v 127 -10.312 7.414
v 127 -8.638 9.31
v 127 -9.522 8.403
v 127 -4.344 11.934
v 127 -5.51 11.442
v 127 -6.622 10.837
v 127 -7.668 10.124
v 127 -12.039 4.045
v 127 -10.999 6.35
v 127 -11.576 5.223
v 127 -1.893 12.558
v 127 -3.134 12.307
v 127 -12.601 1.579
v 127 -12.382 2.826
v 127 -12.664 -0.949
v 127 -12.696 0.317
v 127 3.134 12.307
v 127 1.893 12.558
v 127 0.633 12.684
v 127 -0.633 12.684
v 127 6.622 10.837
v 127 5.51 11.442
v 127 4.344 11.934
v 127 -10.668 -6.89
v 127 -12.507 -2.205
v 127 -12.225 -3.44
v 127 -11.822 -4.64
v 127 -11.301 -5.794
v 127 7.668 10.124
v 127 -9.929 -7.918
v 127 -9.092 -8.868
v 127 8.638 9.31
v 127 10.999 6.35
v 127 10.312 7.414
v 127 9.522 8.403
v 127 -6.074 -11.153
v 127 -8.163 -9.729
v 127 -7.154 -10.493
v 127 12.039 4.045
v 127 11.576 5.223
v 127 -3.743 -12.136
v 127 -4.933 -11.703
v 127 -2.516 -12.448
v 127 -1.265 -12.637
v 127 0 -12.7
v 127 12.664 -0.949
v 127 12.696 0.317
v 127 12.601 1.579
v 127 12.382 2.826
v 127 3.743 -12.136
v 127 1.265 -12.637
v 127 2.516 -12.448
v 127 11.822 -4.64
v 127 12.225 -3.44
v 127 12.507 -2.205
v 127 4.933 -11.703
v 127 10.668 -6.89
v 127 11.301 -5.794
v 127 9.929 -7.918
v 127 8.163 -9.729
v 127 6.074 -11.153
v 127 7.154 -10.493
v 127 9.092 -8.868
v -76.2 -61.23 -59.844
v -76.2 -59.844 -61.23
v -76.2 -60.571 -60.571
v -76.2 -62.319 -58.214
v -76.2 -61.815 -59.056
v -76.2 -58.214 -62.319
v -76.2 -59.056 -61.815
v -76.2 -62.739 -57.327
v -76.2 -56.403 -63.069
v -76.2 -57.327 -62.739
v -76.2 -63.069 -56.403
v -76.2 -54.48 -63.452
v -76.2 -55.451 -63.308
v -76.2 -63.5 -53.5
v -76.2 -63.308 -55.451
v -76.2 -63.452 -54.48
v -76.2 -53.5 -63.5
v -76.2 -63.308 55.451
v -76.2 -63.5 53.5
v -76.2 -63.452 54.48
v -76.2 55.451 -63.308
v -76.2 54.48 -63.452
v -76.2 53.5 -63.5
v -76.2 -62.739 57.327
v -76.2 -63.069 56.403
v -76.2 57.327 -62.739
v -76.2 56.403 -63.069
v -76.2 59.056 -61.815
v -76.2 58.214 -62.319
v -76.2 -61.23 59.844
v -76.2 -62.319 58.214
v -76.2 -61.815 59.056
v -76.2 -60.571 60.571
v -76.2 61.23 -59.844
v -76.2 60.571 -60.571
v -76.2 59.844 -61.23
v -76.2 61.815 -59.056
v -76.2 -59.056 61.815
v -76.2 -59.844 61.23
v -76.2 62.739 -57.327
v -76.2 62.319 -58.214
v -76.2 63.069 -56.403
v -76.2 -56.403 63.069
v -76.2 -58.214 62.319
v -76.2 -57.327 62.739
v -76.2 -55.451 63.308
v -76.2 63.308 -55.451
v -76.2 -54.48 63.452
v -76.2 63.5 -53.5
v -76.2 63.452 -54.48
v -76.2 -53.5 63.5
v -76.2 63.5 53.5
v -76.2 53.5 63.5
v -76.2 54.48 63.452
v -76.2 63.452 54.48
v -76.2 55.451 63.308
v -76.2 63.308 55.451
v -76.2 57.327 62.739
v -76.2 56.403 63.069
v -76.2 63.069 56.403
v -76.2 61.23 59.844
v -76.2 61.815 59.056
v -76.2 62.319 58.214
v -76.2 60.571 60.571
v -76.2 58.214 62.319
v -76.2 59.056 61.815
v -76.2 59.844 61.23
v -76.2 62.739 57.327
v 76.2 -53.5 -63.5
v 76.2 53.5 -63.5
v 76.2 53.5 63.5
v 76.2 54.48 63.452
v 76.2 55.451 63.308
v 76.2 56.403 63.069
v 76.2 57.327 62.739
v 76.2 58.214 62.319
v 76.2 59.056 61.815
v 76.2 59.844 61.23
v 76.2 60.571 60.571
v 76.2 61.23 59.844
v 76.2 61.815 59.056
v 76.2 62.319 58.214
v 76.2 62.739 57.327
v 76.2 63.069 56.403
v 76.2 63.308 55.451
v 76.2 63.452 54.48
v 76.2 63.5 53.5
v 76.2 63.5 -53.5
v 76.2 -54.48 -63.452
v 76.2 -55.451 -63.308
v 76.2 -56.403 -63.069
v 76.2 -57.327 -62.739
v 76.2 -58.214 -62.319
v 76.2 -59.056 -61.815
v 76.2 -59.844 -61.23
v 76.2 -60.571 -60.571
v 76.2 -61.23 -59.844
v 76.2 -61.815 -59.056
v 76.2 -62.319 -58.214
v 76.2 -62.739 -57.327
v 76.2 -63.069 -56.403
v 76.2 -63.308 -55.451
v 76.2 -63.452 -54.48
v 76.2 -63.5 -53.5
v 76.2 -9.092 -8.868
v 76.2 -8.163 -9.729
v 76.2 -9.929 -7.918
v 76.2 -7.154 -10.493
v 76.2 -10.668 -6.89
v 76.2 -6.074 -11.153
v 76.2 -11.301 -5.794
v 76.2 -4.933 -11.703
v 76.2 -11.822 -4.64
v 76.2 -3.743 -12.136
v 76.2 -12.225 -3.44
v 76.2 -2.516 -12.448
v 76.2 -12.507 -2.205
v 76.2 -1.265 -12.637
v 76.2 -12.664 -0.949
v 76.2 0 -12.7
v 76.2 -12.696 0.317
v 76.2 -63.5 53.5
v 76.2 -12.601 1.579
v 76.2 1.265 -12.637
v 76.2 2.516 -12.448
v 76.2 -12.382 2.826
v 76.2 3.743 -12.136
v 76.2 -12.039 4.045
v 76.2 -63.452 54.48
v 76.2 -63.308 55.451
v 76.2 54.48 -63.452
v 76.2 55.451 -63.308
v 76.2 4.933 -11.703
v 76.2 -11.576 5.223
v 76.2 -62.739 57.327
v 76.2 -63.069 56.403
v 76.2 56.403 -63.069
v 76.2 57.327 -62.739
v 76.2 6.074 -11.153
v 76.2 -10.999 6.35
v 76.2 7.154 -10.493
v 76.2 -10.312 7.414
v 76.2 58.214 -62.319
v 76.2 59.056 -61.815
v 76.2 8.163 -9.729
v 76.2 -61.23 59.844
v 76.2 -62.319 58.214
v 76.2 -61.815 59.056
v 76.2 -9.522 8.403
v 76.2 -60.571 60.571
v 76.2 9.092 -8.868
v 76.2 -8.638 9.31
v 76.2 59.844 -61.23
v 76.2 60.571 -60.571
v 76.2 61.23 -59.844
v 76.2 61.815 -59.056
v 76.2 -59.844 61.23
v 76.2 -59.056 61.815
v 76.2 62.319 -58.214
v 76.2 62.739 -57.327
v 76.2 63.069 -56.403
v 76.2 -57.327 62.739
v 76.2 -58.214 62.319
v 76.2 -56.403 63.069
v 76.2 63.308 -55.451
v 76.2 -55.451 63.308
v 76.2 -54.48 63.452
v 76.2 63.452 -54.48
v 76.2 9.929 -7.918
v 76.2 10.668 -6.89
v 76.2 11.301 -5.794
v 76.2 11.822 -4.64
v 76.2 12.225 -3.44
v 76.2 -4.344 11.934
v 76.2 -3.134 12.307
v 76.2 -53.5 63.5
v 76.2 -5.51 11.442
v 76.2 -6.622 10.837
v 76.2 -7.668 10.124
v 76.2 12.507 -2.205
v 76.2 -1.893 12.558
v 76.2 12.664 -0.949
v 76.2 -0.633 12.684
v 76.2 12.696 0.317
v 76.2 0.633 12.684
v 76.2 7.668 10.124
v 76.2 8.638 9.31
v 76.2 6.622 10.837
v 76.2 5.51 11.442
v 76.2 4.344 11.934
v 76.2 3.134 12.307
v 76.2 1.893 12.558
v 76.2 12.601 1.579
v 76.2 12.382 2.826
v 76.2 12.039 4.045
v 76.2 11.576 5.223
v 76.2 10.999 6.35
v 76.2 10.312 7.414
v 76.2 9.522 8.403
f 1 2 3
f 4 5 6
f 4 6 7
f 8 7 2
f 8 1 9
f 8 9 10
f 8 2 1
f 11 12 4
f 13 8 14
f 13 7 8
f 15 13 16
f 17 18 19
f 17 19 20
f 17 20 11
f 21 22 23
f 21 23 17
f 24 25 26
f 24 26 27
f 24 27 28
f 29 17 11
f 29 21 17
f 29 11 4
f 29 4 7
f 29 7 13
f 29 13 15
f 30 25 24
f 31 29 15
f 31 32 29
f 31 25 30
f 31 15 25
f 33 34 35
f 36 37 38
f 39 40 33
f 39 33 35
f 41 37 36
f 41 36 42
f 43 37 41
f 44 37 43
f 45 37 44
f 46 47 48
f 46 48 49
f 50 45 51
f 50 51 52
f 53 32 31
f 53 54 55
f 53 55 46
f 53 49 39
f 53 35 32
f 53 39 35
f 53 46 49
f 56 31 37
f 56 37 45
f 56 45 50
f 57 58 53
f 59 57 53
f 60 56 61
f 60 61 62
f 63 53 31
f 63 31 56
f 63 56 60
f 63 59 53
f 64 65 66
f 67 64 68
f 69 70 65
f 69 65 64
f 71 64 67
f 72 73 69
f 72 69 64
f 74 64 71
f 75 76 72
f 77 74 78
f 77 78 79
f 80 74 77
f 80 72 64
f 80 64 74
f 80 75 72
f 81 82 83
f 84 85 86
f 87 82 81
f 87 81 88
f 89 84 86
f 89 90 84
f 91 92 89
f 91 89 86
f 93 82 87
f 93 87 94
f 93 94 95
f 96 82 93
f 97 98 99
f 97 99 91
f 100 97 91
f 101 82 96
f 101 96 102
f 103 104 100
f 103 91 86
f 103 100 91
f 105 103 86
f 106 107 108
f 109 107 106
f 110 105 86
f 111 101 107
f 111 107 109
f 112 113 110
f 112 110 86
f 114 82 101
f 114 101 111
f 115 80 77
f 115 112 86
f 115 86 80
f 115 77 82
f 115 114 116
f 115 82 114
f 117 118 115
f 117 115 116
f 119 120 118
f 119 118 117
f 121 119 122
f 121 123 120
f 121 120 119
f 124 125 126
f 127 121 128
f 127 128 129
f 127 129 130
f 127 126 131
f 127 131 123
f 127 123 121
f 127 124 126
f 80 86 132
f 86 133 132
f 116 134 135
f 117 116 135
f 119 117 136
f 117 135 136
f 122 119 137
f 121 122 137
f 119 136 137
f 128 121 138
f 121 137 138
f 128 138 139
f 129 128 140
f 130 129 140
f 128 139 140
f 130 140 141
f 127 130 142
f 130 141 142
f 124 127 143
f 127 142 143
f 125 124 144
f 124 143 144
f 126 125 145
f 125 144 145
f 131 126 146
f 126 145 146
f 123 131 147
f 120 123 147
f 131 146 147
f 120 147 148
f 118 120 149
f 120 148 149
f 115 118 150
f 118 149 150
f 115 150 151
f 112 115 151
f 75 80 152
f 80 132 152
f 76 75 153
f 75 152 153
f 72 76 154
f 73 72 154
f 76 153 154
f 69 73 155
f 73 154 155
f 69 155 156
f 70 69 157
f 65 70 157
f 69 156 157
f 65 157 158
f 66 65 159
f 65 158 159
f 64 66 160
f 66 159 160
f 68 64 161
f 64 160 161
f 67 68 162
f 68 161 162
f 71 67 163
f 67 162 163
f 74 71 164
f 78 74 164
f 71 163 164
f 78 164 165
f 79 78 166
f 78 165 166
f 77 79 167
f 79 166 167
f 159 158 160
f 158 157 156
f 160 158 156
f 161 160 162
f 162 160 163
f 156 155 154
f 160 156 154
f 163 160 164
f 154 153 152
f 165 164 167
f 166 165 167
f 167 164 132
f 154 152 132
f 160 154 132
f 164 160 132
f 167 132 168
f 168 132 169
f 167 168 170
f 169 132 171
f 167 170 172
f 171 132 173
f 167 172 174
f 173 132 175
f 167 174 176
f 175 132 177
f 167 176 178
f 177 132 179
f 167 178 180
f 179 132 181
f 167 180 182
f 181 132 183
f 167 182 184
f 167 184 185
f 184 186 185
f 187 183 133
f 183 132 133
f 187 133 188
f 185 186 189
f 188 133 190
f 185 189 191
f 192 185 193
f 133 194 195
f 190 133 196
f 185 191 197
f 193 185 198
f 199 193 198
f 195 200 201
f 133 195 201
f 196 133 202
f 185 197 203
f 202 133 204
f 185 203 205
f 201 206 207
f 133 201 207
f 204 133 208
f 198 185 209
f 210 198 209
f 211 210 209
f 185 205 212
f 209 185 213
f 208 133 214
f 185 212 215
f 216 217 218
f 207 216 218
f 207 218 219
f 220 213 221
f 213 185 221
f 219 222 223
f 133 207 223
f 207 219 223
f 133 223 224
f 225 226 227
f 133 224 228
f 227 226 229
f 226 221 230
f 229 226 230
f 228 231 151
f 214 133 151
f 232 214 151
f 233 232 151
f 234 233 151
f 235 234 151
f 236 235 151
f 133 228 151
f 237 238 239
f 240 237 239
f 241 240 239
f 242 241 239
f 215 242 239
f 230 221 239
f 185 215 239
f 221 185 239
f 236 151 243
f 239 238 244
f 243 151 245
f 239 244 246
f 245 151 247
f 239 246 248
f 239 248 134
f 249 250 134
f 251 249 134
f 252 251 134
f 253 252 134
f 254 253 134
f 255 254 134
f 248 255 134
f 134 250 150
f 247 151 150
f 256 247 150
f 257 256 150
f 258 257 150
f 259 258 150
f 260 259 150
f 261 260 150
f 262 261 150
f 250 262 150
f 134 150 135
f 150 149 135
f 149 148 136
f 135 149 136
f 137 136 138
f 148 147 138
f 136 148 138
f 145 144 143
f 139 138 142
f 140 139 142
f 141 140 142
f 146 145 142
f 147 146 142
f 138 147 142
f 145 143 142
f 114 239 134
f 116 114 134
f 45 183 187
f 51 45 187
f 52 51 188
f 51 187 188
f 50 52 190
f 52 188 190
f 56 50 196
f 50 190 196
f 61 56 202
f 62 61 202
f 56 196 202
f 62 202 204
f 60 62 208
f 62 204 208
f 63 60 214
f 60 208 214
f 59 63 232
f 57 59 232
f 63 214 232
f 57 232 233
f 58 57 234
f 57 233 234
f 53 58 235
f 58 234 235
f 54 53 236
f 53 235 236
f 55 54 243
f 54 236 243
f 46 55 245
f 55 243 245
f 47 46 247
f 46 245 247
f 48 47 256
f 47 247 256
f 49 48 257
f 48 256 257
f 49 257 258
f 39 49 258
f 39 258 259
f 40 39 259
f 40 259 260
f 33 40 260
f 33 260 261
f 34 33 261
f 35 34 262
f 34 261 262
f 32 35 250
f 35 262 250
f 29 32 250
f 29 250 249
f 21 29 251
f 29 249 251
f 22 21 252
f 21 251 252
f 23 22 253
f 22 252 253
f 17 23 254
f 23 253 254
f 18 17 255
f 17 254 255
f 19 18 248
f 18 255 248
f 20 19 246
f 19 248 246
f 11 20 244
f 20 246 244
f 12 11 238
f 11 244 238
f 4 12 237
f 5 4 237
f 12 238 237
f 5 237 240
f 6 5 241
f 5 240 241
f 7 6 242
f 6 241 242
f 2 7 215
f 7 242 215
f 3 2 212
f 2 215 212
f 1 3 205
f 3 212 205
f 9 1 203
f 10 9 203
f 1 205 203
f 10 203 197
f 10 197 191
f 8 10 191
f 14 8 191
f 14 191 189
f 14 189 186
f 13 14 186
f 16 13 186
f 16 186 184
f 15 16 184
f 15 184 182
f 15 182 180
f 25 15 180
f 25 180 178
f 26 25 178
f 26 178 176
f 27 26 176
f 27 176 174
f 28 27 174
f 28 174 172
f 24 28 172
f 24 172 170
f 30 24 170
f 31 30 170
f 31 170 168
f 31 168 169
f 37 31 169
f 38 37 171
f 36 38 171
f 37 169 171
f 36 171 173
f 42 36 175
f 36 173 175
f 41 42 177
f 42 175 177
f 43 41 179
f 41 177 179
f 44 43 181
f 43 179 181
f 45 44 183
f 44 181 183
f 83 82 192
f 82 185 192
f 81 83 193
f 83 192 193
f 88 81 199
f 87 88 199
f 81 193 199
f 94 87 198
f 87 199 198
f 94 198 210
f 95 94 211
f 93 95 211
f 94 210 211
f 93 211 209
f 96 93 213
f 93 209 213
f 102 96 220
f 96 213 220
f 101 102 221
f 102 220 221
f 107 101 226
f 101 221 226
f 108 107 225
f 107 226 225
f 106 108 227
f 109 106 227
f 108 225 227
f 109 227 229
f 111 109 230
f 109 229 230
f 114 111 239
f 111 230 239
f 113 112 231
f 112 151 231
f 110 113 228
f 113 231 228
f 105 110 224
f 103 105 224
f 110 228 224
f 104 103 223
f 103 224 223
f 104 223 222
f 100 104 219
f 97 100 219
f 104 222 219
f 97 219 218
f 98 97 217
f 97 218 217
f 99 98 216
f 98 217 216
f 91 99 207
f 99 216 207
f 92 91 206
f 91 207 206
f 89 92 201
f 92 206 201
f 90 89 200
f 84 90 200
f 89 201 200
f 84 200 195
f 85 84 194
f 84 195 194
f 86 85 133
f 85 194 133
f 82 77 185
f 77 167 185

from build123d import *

# Parameters (mm, degrees)
BOSS_EXTRUDE1_DEPTH = 76.2
SKETCH2_R           = 12.7
BOSS_EXTRUDE2_DEPTH = 50.8


with BuildPart() as part:
    # Sketch1 → Boss-Extrude1 (new body, symmetric)
    with BuildSketch(Plane(origin=(0, 0, 0), x_dir=(0, 0, -1), z_dir=(1, 0, 0))):
        with BuildLine():
            Line((-53.5, 63.5), (53.5, 63.5))
            ThreePointArc((53.5, 63.5), (60.571067812, 60.571067812), (63.5, 53.5))
            Line((63.5, 53.5), (63.5, -53.5))
            ThreePointArc((63.5, -53.5), (60.571067812, -60.571067812), (53.5, -63.5))
            Line((53.5, -63.5), (-53.5, -63.5))
            ThreePointArc((-53.5, -63.5), (-60.571067812, -60.571067812), (-63.5, -53.5))
            Line((-63.5, -53.5), (-63.5, 53.5))
            ThreePointArc((-63.5, 53.5), (-60.571067812, 60.571067812), (-53.5, 63.5))
        make_face()
    extrude(amount=BOSS_EXTRUDE1_DEPTH, both=True)

    # Sketch2 → Boss-Extrude2 (add)
    with BuildSketch(Plane(origin=(76.2, 0, 0), x_dir=(0, 0, -1), z_dir=(1, 0, 0))):
        Circle(SKETCH2_R)
    extrude(amount=BOSS_EXTRUDE2_DEPTH)


solid = part.part
